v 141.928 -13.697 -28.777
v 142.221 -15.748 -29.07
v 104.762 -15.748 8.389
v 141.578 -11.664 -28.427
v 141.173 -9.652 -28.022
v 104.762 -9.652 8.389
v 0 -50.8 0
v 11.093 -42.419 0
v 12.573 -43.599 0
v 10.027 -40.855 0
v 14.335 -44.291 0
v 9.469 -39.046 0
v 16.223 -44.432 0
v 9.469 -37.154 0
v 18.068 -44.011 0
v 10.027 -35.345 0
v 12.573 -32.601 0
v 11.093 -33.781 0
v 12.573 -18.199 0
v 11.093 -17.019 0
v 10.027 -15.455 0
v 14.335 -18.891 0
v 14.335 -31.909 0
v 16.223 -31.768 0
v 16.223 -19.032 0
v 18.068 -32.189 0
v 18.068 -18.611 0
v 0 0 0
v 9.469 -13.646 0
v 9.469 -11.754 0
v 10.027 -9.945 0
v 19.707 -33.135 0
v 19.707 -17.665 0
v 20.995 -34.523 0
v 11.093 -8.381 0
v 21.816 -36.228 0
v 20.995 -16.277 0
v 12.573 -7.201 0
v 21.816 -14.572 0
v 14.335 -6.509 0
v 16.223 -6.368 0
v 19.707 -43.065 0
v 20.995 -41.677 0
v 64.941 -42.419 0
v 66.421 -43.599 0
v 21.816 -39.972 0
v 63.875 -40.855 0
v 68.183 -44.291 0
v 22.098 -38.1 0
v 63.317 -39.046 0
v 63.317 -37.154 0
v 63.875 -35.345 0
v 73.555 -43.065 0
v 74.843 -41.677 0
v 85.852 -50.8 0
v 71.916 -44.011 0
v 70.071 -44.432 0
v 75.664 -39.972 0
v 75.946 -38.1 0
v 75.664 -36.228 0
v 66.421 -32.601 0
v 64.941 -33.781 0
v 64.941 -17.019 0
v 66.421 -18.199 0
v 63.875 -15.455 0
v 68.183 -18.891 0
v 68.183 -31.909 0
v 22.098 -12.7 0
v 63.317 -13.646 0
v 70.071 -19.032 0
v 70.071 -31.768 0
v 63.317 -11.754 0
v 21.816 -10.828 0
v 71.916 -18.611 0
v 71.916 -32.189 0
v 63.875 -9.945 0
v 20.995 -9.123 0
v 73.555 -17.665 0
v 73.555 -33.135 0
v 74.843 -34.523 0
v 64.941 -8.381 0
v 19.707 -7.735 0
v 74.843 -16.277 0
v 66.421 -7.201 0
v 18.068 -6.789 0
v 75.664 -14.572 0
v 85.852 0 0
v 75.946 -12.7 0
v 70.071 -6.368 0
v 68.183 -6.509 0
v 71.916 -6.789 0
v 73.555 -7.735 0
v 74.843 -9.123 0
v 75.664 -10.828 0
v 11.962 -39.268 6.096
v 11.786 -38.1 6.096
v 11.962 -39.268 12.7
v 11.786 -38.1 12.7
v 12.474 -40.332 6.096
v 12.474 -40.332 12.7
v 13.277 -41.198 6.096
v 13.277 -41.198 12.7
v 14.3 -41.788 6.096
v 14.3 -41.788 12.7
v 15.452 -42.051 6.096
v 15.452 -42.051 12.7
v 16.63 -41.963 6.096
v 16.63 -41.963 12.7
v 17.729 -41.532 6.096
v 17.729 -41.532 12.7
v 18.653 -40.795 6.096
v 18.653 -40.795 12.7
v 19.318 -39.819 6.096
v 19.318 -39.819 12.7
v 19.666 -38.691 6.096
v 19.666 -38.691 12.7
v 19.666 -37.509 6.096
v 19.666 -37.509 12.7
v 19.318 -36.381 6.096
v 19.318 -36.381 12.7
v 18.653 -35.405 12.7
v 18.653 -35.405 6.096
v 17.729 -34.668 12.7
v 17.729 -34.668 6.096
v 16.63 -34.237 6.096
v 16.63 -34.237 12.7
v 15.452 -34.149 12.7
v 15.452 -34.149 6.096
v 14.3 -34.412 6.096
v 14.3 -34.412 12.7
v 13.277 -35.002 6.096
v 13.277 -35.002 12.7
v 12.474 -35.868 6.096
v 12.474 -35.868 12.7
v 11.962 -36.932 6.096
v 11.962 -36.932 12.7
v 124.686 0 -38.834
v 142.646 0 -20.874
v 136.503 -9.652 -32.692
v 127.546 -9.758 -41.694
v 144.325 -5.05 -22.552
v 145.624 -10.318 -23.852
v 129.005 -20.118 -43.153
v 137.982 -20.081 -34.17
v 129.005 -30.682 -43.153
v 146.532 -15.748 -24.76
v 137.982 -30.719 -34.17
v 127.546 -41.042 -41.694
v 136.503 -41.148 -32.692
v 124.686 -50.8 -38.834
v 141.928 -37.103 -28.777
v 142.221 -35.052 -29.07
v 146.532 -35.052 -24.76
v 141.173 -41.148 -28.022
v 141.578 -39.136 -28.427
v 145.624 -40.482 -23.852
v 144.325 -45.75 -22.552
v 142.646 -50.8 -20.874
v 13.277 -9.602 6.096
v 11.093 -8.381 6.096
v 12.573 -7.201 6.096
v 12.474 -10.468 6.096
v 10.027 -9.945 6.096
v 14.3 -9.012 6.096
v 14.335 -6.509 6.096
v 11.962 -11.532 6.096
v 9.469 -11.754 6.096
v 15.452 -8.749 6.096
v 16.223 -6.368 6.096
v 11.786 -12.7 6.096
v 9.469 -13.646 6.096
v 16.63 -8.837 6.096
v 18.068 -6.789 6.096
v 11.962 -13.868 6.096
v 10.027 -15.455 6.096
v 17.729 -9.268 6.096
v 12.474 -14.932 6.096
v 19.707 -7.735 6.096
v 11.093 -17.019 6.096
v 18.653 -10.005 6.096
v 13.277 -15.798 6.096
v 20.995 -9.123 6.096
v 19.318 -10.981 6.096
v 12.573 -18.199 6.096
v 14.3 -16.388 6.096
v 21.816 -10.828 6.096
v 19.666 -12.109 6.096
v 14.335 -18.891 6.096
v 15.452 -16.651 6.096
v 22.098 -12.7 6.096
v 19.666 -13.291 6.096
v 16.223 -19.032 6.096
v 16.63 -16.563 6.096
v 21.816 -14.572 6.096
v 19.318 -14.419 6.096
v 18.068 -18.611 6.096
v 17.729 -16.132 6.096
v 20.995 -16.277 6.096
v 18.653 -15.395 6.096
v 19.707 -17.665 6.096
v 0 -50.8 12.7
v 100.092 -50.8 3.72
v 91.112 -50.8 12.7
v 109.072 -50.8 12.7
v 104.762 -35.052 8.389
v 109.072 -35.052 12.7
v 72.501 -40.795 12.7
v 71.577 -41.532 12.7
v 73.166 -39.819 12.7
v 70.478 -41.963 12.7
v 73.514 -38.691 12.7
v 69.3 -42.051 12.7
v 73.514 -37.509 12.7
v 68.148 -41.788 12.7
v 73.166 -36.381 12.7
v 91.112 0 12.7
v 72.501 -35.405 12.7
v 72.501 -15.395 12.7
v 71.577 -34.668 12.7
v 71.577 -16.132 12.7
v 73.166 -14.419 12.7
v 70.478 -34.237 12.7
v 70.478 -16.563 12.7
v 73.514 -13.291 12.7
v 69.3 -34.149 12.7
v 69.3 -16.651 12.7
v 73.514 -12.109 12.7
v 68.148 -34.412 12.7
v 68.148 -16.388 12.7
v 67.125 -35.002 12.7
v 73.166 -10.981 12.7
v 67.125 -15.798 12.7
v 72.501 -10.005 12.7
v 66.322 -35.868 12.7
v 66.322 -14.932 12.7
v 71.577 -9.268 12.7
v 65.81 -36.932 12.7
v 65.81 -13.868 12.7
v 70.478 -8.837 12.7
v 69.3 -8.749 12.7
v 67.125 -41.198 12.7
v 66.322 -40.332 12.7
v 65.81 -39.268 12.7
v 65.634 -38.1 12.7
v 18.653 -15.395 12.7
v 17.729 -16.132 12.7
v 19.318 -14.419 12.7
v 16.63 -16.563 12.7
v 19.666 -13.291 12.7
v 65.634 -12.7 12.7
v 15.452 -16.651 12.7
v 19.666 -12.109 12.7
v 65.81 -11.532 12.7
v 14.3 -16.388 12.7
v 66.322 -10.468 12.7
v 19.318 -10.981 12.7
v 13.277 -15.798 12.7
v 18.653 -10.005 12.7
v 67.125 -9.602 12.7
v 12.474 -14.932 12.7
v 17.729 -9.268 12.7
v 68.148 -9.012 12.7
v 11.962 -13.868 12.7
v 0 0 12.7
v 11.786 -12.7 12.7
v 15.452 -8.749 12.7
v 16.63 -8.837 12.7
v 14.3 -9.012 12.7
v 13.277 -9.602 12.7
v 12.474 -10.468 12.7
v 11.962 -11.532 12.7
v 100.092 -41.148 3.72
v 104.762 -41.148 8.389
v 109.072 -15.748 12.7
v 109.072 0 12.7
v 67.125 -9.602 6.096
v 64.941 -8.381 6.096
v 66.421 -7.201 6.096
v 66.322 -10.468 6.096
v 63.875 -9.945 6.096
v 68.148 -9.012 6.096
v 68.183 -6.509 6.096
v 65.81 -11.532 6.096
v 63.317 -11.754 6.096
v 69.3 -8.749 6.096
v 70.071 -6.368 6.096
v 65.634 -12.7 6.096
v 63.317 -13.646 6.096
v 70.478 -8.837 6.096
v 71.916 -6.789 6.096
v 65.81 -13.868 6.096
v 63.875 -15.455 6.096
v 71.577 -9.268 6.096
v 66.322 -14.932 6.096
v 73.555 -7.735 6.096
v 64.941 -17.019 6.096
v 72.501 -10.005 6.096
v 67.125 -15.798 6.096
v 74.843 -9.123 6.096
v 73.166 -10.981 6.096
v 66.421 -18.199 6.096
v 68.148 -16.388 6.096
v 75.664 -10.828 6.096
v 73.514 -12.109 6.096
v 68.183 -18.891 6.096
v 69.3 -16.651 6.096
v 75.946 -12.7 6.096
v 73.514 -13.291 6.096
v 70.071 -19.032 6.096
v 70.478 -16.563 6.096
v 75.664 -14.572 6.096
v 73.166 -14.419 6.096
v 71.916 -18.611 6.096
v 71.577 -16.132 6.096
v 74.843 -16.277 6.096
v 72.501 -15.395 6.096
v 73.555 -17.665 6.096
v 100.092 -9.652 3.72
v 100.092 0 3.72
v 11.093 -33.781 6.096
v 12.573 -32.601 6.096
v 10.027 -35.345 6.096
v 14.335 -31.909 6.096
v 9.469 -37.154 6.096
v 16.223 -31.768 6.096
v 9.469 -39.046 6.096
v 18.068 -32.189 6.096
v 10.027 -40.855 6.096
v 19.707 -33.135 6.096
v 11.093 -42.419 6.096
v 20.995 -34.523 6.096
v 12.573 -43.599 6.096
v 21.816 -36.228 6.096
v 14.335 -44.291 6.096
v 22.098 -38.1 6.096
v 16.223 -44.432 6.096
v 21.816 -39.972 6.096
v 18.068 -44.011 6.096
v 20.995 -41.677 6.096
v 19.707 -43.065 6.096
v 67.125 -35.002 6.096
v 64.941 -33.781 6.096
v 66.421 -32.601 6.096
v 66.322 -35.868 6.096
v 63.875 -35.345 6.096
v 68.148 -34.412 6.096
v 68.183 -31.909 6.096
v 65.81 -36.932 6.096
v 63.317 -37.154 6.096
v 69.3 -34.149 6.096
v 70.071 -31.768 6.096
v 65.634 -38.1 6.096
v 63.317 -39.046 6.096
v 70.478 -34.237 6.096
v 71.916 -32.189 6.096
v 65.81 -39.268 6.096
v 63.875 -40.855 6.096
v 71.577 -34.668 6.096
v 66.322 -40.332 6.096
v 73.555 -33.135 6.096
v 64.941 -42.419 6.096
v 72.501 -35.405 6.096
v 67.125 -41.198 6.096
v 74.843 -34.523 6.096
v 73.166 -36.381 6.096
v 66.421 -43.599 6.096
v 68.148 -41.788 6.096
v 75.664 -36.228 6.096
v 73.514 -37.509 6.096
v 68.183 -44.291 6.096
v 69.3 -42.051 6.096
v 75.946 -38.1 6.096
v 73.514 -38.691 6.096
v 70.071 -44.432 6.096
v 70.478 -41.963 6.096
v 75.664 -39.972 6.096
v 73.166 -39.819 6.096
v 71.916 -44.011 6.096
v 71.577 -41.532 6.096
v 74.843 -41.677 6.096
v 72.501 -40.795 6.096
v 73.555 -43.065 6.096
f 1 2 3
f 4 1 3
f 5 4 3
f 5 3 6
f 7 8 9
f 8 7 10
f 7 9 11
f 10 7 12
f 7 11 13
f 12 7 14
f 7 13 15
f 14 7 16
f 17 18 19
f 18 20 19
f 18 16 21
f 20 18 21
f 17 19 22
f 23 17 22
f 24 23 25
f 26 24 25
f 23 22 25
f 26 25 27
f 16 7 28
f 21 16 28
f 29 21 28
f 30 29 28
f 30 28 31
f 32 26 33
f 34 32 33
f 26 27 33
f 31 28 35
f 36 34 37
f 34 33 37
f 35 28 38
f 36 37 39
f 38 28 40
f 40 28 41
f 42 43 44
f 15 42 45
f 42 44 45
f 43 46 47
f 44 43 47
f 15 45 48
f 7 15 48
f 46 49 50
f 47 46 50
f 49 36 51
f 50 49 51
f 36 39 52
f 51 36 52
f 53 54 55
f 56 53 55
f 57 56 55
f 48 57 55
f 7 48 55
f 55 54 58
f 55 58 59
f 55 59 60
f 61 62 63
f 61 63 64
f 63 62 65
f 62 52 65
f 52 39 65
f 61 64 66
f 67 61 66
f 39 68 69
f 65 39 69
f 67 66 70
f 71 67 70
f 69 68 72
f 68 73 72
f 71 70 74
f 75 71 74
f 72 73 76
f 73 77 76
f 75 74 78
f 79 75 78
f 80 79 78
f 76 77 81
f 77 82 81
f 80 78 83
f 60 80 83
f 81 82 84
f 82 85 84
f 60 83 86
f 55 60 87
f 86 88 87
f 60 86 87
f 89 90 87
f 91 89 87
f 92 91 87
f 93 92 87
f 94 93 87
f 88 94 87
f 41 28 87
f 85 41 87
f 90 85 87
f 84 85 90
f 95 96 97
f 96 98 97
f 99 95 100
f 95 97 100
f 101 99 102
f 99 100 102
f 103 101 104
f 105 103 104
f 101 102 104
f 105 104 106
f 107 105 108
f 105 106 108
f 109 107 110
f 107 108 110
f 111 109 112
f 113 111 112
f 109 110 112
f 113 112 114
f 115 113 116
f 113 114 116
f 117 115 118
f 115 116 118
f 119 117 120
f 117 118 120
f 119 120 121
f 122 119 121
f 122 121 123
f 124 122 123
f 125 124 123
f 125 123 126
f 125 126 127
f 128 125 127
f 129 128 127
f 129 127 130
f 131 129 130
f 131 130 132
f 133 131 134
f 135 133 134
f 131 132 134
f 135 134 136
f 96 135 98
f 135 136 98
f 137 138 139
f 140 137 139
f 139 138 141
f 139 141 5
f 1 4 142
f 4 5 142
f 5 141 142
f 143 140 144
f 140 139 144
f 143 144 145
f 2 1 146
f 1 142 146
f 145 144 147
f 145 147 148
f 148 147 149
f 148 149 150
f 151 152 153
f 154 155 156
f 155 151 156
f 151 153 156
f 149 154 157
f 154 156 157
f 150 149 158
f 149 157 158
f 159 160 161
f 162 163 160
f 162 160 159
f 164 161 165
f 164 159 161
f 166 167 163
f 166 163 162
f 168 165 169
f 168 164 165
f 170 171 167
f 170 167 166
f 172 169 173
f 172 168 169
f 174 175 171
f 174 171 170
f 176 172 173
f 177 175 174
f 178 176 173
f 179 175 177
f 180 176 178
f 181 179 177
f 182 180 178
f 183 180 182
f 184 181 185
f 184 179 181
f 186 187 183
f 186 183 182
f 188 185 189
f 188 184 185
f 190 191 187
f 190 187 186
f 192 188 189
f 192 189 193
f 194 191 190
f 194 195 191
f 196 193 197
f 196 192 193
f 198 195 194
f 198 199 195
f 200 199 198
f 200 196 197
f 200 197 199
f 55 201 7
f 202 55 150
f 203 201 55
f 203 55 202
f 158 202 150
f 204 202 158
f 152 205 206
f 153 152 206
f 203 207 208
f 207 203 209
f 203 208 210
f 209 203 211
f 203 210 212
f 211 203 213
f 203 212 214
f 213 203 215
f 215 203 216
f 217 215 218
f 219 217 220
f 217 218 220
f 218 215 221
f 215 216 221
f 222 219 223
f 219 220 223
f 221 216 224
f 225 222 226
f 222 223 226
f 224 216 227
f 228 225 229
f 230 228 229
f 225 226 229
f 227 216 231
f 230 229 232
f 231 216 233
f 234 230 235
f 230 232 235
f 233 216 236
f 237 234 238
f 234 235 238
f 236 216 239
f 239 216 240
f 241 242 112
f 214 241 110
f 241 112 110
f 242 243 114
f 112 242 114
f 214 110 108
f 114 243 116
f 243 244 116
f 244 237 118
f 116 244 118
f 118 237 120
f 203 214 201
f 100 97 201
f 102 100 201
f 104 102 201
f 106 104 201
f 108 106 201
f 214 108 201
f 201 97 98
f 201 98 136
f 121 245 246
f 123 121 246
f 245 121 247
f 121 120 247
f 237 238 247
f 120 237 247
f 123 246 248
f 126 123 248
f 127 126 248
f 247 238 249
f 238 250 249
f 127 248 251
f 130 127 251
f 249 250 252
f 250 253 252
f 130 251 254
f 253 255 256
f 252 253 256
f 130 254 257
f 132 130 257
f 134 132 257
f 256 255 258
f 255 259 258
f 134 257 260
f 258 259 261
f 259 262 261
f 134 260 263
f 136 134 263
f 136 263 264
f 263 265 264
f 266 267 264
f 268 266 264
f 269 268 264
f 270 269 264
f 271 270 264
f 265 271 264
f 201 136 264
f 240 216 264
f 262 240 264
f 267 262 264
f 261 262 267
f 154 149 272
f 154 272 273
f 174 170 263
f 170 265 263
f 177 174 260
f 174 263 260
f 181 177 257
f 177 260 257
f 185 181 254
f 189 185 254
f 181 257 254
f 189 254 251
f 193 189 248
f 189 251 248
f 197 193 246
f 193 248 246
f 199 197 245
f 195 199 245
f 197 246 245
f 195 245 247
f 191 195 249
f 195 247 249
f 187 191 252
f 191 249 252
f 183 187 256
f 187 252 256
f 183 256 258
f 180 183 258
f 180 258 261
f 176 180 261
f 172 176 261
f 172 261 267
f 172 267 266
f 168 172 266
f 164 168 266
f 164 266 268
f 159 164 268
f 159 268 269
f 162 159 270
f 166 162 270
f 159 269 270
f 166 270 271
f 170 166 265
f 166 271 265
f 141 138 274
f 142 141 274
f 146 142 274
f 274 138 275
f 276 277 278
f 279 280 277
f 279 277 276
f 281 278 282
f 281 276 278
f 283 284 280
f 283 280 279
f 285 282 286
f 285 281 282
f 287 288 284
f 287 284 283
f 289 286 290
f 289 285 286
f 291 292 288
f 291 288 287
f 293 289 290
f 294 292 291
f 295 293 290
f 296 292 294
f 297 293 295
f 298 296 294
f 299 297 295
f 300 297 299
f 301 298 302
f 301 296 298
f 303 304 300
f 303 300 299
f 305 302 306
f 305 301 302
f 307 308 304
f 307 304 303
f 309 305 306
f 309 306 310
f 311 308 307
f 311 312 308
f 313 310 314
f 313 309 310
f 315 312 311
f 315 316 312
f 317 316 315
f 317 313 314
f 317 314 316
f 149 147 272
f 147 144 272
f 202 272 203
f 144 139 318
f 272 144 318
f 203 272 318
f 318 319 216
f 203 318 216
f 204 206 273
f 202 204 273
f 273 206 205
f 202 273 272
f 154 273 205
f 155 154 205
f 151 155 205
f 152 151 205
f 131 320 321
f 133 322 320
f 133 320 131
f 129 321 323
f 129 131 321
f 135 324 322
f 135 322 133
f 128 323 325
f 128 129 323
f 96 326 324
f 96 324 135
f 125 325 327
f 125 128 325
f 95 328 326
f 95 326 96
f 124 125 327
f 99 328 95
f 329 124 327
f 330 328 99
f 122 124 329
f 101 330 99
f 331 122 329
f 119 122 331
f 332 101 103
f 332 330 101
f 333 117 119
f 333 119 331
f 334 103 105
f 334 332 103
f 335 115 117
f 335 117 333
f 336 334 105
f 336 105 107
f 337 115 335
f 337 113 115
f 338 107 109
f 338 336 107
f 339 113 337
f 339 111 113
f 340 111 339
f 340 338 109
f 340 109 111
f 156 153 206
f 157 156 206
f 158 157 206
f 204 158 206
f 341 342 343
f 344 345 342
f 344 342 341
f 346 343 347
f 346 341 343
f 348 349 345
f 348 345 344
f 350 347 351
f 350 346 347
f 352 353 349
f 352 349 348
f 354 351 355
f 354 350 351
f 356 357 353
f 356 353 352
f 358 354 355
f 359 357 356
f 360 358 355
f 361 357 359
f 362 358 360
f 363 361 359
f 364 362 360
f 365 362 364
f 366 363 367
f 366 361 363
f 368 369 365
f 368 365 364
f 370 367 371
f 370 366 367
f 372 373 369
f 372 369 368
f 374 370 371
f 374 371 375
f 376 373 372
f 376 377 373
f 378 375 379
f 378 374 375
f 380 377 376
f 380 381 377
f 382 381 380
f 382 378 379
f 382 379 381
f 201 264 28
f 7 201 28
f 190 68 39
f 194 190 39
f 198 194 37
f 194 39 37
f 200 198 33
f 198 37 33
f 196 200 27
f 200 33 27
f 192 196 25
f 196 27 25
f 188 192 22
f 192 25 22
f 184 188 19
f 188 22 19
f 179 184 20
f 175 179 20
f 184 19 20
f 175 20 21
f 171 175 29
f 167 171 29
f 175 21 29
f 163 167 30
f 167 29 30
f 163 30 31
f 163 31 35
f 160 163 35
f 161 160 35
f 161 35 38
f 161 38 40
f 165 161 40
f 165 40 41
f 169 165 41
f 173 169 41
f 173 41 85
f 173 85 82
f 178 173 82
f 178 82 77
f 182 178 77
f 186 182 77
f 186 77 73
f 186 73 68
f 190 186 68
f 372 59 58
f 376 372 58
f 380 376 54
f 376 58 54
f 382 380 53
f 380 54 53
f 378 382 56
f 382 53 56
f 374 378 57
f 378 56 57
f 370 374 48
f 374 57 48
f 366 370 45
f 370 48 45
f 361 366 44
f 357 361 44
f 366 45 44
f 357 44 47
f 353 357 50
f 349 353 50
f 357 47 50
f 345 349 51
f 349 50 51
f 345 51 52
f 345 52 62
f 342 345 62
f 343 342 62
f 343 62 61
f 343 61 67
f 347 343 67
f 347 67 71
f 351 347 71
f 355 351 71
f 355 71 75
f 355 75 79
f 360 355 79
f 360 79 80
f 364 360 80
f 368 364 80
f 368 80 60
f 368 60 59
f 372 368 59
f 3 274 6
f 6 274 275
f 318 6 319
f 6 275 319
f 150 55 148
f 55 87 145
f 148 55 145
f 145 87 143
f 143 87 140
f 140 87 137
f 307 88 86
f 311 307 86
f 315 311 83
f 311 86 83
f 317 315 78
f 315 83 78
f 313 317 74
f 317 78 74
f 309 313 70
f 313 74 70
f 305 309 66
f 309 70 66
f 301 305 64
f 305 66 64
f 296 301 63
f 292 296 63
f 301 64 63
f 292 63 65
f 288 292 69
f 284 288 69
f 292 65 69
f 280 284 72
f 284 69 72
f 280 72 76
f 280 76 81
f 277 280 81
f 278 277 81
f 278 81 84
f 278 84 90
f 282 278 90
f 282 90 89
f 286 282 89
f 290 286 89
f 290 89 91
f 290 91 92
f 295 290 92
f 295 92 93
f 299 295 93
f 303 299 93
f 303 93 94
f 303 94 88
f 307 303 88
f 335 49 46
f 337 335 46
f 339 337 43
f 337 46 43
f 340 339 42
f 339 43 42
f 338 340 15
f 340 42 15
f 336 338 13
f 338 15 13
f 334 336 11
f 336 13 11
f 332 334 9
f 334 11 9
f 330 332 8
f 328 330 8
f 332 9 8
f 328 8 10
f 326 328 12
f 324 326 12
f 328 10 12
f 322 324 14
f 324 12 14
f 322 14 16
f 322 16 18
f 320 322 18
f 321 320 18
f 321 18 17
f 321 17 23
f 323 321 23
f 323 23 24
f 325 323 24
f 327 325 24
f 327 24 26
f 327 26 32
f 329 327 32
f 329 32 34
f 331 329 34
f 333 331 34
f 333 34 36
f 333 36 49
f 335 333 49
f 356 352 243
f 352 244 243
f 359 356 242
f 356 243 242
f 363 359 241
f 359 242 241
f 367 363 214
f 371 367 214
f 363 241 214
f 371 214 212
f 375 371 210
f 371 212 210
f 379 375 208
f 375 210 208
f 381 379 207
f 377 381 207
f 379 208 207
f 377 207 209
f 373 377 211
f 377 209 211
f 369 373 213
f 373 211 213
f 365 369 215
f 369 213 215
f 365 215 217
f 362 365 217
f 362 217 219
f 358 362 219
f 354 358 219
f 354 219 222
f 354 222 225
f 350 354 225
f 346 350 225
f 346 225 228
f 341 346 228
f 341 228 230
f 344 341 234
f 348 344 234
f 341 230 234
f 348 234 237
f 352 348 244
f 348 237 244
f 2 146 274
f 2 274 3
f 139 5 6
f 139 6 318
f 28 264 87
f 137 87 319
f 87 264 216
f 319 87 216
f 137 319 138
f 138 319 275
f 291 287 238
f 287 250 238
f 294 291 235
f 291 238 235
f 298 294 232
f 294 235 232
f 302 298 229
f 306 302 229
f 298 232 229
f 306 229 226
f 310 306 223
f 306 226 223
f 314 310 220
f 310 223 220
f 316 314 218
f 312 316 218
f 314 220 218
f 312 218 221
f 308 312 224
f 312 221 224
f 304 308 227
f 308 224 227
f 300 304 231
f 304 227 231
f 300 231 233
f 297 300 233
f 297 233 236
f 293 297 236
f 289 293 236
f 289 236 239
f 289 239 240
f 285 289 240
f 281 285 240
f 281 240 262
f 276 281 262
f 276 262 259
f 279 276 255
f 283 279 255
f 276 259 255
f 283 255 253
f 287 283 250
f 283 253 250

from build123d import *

# Parameters (mm, degrees)
F1_DEPTH       = 50.8
F3_D           = 7.9248
F3_CBORE_D     = 12.7
F3_CBORE_DEPTH = 6.096
F5_DEPTH       = 118.4823439803
F7_DEPTH       = 66.5486543438


with BuildPart() as f1:
    # F0 (on Front) → F1 (new body)
    with BuildSketch(Plane.XZ):
        Polygon((0, 12.7), (0, 0), (85.852, 0), (131.6378767242, -45.7858767242), (149.7304108726, -27.9583640517), (109.0720468209, 12.7), (100.0917906999, 3.7197438789), (91.1115345788, 12.7), align=None)
    extrude(amount=F1_DEPTH)

    # F3 (through all)
    with Locations(Plane(origin=(0, 0, 0), x_dir=(1, 0, 0), z_dir=(0, 0, -1))):
        with Locations((15.748, 12.7), (15.748, 38.1), (69.596, 38.1), (69.596, 12.7)):
            CounterBoreHole(F3_D / 2, F3_CBORE_D / 2, F3_CBORE_DEPTH)

    # F4 (on face) → F5 (cut, through all)
    with BuildSketch(Plane(origin=(60.8860234105, 0, 60.8860234105), x_dir=(0.7071067812, 0, -0.7071067812), z_dir=(0.7071067812, 0, 0.7071067812))):
        with BuildLine():
            ThreePointArc((115.6263461786, 0), (121.9933278239, -25.4), (115.6263461786, -50.8))
            Line((115.6263461786, -50.8), (125.6449376897, -50.8))
            Line((125.6449376897, -50.8), (125.6449376897, 0))
            Line((125.6449376897, 0), (115.6263461786, 0))
        make_face()
    extrude(amount=-F5_DEPTH, mode=Mode.SUBTRACT)

    # F6 (on face) → F7 (cut, through all)
    with BuildSketch(Plane(origin=(48.1860234105, 0, -48.1860234105), x_dir=(0, -1, 0), z_dir=(-0.7071067812, 0, 0.7071067812))):
        Polygon((9.652, 73.405840066), (41.148, 73.405840066), (41.148, 80.009840066), (35.052, 80.009840066), (35.052, 86.105840066), (15.748, 86.105840066), (15.748, 80.009840066), (9.652, 80.009840066), align=None)
    extrude(amount=-F7_DEPTH, mode=Mode.SUBTRACT)


solid = f1.part
